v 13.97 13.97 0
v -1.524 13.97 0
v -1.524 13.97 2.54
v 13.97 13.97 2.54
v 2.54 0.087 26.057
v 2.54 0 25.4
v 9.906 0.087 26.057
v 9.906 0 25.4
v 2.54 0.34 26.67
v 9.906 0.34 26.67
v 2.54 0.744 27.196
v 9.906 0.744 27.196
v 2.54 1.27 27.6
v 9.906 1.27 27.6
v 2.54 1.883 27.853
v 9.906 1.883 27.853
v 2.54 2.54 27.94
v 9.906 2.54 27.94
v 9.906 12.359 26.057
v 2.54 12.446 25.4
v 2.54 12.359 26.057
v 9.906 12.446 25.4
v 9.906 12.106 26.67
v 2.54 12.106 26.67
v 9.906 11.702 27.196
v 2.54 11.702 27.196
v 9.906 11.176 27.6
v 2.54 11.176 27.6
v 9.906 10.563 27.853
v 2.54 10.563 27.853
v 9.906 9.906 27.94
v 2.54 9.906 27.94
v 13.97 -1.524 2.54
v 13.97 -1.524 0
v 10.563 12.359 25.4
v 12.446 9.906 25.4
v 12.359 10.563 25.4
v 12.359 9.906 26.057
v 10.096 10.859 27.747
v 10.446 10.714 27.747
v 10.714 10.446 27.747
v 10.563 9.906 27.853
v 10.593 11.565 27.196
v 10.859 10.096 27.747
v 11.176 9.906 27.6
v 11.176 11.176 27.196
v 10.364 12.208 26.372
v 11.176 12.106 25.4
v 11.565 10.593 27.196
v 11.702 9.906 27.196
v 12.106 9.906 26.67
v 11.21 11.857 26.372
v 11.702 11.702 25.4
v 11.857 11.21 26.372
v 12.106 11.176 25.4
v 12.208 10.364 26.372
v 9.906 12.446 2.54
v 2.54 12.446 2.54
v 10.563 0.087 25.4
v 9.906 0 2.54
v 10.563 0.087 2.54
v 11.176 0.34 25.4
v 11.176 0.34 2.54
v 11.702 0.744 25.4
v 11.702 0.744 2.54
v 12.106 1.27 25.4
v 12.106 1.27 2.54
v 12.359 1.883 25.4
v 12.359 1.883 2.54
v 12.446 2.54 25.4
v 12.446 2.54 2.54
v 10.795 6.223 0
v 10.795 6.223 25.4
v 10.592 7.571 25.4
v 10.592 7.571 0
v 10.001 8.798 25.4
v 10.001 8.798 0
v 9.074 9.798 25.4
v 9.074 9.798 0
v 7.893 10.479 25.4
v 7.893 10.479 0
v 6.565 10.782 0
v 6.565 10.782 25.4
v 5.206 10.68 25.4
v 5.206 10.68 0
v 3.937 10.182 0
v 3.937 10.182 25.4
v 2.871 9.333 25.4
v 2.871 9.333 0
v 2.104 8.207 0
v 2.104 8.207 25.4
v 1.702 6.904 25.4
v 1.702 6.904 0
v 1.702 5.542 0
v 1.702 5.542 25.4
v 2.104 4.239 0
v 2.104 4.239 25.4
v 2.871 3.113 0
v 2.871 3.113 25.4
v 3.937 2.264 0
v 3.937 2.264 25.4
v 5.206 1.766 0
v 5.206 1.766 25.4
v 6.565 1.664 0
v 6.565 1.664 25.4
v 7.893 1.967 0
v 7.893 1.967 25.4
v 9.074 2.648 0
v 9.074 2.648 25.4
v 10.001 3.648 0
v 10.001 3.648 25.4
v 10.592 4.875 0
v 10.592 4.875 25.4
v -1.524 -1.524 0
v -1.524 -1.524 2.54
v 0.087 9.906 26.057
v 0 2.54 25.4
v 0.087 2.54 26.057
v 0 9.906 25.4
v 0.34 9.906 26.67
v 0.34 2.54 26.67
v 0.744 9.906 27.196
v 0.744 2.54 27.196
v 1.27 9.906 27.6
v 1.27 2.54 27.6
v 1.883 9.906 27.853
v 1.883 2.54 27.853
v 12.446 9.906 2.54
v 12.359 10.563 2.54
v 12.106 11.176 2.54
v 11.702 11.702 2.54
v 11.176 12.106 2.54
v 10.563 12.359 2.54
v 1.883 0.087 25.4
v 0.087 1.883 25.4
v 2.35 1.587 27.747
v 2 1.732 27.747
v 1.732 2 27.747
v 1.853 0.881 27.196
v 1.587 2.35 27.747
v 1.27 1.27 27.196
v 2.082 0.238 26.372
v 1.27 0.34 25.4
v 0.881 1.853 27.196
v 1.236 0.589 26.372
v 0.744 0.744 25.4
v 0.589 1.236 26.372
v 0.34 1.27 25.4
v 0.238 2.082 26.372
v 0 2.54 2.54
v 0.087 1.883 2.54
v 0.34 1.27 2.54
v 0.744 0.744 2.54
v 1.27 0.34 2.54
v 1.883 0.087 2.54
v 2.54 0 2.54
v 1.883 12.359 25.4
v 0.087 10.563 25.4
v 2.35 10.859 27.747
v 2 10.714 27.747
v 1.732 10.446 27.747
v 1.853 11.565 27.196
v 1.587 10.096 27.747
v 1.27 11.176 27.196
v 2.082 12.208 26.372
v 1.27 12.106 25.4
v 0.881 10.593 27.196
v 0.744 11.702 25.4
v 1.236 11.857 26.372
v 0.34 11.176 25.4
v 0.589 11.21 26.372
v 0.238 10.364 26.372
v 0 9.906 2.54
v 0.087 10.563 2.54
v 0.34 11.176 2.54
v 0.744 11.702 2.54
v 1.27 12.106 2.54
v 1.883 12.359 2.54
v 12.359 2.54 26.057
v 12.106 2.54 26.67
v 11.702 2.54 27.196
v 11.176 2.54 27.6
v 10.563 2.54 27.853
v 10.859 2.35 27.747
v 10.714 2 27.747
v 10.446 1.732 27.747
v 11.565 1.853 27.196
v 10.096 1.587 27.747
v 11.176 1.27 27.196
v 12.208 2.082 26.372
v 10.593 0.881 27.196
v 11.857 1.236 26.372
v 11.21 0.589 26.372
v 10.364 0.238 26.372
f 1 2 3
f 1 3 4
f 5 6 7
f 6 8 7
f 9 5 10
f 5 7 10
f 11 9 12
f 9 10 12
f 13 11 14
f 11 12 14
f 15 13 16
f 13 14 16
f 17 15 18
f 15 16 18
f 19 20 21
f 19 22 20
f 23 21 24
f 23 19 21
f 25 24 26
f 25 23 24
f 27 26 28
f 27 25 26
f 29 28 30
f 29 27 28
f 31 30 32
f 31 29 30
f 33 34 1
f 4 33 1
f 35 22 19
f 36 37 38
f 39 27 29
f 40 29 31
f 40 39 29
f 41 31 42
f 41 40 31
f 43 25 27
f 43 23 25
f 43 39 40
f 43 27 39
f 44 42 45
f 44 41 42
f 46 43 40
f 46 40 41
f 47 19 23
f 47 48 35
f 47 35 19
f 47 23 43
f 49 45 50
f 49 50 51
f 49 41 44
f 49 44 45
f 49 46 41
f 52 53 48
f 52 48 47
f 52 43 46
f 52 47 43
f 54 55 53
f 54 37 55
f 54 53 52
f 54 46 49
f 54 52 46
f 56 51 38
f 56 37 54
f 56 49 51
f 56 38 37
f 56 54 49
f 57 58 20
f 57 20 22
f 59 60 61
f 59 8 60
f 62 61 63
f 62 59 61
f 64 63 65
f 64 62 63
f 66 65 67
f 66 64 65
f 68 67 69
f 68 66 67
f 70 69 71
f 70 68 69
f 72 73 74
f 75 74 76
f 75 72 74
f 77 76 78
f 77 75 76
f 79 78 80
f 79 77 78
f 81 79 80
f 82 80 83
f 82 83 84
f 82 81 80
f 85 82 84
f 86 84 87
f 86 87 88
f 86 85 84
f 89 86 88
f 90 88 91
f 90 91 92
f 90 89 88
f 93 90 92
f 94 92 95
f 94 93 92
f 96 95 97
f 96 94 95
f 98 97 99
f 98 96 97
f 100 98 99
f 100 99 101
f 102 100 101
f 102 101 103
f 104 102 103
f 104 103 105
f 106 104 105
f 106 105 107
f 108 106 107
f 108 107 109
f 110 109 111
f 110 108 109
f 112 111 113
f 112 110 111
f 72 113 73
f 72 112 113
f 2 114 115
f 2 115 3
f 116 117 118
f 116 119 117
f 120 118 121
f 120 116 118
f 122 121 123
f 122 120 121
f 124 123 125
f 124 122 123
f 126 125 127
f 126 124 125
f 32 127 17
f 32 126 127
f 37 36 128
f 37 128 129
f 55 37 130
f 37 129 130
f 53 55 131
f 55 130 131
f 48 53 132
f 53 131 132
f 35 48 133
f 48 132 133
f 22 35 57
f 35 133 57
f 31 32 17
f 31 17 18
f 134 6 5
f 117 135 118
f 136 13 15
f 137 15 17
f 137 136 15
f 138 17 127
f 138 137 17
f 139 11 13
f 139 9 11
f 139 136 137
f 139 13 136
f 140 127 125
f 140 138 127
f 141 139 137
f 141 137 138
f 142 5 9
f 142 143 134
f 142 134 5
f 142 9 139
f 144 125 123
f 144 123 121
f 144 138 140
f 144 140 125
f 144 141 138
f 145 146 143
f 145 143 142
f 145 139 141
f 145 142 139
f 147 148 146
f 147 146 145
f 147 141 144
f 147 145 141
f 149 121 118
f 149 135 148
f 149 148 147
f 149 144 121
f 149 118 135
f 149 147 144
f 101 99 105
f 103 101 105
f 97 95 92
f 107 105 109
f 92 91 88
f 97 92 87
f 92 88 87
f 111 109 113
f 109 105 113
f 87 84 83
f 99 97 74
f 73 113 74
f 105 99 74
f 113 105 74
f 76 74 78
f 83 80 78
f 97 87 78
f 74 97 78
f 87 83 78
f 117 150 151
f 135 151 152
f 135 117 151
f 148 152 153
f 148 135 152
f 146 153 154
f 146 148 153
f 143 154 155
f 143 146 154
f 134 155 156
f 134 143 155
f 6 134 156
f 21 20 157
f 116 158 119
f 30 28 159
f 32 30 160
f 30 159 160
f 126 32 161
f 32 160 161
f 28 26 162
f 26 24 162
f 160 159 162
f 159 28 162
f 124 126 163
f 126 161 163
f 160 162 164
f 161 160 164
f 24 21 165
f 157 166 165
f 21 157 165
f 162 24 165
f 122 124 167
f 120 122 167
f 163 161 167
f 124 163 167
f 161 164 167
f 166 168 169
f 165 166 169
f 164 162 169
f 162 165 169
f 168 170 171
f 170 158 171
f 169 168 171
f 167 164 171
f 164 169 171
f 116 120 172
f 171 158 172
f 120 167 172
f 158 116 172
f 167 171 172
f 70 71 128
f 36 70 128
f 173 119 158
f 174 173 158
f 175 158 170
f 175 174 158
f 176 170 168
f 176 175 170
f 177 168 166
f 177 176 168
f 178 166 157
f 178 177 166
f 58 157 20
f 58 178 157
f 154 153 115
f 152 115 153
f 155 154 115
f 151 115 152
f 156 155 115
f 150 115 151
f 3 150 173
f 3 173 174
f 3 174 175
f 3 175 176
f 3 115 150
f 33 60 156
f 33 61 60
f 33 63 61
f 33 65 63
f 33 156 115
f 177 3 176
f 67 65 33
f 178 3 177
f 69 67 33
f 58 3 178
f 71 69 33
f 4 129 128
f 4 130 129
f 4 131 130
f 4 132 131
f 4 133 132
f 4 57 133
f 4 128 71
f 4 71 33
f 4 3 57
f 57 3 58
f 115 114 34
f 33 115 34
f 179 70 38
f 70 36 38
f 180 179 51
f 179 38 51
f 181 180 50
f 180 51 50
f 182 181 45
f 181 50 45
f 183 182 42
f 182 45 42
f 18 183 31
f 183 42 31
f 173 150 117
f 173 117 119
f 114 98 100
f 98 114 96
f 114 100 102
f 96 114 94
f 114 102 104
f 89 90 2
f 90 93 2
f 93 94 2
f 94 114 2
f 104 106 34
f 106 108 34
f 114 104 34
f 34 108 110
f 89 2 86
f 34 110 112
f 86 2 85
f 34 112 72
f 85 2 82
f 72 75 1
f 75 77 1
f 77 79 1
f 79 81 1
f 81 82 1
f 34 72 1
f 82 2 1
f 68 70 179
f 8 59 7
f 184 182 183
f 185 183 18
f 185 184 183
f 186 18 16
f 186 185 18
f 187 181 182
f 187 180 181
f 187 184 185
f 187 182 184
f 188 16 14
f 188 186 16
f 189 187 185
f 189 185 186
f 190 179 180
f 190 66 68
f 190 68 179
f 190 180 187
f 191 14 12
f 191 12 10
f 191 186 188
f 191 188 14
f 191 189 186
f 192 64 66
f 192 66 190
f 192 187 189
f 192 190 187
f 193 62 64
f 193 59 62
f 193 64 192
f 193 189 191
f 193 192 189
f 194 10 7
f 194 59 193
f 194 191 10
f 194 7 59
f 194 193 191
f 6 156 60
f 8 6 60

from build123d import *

# Parameters (mm, degrees)
F0_W     = 12.446
F0_H     = 12.446
F0_R     = 4.572
F1_DEPTH = 25.4
F0_W_2   = 15.494
F0_H_2   = 15.494
F2_DEPTH = 2.54
F3_W     = 12.446
F3_H     = 12.446
F3_R     = 4.572
F4_DEPTH = 2.54
F5_R     = 2.54


with BuildPart() as f1:
    # F0 (on Top) → F1 (new body)
    with BuildSketch(Plane.XY):
        with Locations((6.223, 6.223)):
            Rectangle(F0_W, F0_H)
        with Locations((6.223, 6.223)):
            Circle(F0_R, mode=Mode.SUBTRACT)
    extrude(amount=F1_DEPTH)

    # F0 (on Top) → F2 (join)
    with BuildSketch(Plane.XY):
        with Locations((6.223, 6.223)):
            Rectangle(F0_W_2, F0_H_2)
        with Locations((6.223, 6.223)):
            Rectangle(F0_W, F0_H, mode=Mode.SUBTRACT)
    extrude(amount=F2_DEPTH)

    # F3 (on face) → F4 (join)
    with BuildSketch(Plane.XY.offset(25.4)):
        with Locations((6.223, 6.223)):
            Rectangle(F3_W, F3_H)
        with Locations((6.223, 6.223)):
            Circle(F3_R, mode=Mode.SUBTRACT)
        with Locations((6.223, 6.223)):
            Circle(F3_R)
    extrude(amount=F4_DEPTH)

    # F5
    f5_edges = [f1.edges().sort_by_distance(p)[0] for p in [
        (0, 12.446, 15.24),
        (12.446, 12.446, 15.24),
        (0, 0, 15.24),
        (12.446, 0, 15.24),
        (6.223, 12.446, 27.94),
        (12.446, 6.223, 27.94),
        (6.223, 0, 27.94),
        (0, 6.223, 27.94),
    ]]
    fillet(f5_edges, radius=F5_R)


solid = f1.part
